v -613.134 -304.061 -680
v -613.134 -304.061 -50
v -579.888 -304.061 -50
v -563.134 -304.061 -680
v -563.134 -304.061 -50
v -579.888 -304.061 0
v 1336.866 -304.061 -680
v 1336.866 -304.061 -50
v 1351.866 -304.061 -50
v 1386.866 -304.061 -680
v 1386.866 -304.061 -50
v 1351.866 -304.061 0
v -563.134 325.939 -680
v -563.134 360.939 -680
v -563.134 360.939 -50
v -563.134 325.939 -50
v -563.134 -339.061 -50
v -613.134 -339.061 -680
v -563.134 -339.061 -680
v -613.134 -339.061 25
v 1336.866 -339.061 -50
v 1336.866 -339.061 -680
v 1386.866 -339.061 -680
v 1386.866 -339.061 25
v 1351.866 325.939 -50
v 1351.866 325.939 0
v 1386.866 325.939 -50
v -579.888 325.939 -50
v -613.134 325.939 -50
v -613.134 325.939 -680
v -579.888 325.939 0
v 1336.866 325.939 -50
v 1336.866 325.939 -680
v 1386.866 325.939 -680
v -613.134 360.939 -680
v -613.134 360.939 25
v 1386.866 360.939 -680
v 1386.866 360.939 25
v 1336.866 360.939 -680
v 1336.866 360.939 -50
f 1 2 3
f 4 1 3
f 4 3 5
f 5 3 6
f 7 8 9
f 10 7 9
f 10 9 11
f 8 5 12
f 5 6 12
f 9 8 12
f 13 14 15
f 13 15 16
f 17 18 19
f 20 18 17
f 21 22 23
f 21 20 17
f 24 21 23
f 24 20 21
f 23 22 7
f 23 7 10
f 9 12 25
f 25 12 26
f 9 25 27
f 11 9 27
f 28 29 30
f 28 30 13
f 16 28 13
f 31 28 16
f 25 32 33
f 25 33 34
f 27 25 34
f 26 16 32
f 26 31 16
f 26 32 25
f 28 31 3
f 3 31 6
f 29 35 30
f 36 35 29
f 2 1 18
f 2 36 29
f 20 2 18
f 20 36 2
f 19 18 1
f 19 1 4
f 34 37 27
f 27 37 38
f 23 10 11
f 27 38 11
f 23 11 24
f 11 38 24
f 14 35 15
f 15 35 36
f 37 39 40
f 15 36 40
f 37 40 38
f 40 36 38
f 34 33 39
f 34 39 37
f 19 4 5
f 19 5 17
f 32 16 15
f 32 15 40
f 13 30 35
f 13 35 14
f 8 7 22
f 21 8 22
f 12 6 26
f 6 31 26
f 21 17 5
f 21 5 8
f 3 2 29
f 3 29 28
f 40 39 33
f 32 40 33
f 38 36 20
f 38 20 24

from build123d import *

# Parameters (mm, degrees)
F0_W     = 2000
F0_H     = 700
F1_DEPTH = 25
F3_DEPTH = 50
F5_W     = 50
F5_H     = 35
F6_DEPTH = 630


with BuildPart() as f1:
    # F0 (on Top) → F1 (new body)
    with BuildSketch(Plane.XY):
        with Locations((386.865544, 10.939363)):
            Rectangle(F0_W, F0_H)
    extrude(amount=F1_DEPTH)

    # F2 (on face) → F3 (join)
    with BuildSketch(Plane(origin=(0, 0, 0), x_dir=(1, 0, 0), z_dir=(0, 0, -1))):
        Polygon((-613.134456, -360.939363), (1052.856326, -360.939363), (1052.856326, -325.939363), (-579.887948, -325.939363), (-579.887948, 0), (-613.134456, -10.939363), align=None)
        Polygon((1052.856326, -325.939363), (1052.856326, -360.939363), (1386.865544, -360.939363), (1386.865544, -10.939363), (1351.865544, -10.939363), (1351.865544, -325.939363), align=None)
        Polygon((1351.865544, -10.939363), (1386.865544, -10.939363), (1386.865544, 339.060637), (1052.856326, 339.060637), (1052.856326, 304.060637), (1351.865544, 304.060637), align=None)
        Polygon((-613.134456, 339.060637), (-613.134456, -10.939363), (-579.887948, 0), (-579.887948, 304.060637), (1052.856326, 304.060637), (1052.856326, 339.060637), align=None)
    extrude(amount=F3_DEPTH)

    # F5 (on face) → F6 (join)
    with BuildSketch(Plane(origin=(0, 0, -50), x_dir=(1, 0, 0), z_dir=(0, 0, -1))):
        with Locations((-588.134456, 321.560637)):
            Rectangle(F5_W, F5_H)
        with Locations((-588.134456, -343.439363)):
            Rectangle(F5_W, F5_H)
        with Locations((1361.865544, -343.439363)):
            Rectangle(F5_W, F5_H)
        with Locations((1361.865544, 321.560637)):
            Rectangle(F5_W, F5_H)
    extrude(amount=F6_DEPTH)


solid = f1.part
